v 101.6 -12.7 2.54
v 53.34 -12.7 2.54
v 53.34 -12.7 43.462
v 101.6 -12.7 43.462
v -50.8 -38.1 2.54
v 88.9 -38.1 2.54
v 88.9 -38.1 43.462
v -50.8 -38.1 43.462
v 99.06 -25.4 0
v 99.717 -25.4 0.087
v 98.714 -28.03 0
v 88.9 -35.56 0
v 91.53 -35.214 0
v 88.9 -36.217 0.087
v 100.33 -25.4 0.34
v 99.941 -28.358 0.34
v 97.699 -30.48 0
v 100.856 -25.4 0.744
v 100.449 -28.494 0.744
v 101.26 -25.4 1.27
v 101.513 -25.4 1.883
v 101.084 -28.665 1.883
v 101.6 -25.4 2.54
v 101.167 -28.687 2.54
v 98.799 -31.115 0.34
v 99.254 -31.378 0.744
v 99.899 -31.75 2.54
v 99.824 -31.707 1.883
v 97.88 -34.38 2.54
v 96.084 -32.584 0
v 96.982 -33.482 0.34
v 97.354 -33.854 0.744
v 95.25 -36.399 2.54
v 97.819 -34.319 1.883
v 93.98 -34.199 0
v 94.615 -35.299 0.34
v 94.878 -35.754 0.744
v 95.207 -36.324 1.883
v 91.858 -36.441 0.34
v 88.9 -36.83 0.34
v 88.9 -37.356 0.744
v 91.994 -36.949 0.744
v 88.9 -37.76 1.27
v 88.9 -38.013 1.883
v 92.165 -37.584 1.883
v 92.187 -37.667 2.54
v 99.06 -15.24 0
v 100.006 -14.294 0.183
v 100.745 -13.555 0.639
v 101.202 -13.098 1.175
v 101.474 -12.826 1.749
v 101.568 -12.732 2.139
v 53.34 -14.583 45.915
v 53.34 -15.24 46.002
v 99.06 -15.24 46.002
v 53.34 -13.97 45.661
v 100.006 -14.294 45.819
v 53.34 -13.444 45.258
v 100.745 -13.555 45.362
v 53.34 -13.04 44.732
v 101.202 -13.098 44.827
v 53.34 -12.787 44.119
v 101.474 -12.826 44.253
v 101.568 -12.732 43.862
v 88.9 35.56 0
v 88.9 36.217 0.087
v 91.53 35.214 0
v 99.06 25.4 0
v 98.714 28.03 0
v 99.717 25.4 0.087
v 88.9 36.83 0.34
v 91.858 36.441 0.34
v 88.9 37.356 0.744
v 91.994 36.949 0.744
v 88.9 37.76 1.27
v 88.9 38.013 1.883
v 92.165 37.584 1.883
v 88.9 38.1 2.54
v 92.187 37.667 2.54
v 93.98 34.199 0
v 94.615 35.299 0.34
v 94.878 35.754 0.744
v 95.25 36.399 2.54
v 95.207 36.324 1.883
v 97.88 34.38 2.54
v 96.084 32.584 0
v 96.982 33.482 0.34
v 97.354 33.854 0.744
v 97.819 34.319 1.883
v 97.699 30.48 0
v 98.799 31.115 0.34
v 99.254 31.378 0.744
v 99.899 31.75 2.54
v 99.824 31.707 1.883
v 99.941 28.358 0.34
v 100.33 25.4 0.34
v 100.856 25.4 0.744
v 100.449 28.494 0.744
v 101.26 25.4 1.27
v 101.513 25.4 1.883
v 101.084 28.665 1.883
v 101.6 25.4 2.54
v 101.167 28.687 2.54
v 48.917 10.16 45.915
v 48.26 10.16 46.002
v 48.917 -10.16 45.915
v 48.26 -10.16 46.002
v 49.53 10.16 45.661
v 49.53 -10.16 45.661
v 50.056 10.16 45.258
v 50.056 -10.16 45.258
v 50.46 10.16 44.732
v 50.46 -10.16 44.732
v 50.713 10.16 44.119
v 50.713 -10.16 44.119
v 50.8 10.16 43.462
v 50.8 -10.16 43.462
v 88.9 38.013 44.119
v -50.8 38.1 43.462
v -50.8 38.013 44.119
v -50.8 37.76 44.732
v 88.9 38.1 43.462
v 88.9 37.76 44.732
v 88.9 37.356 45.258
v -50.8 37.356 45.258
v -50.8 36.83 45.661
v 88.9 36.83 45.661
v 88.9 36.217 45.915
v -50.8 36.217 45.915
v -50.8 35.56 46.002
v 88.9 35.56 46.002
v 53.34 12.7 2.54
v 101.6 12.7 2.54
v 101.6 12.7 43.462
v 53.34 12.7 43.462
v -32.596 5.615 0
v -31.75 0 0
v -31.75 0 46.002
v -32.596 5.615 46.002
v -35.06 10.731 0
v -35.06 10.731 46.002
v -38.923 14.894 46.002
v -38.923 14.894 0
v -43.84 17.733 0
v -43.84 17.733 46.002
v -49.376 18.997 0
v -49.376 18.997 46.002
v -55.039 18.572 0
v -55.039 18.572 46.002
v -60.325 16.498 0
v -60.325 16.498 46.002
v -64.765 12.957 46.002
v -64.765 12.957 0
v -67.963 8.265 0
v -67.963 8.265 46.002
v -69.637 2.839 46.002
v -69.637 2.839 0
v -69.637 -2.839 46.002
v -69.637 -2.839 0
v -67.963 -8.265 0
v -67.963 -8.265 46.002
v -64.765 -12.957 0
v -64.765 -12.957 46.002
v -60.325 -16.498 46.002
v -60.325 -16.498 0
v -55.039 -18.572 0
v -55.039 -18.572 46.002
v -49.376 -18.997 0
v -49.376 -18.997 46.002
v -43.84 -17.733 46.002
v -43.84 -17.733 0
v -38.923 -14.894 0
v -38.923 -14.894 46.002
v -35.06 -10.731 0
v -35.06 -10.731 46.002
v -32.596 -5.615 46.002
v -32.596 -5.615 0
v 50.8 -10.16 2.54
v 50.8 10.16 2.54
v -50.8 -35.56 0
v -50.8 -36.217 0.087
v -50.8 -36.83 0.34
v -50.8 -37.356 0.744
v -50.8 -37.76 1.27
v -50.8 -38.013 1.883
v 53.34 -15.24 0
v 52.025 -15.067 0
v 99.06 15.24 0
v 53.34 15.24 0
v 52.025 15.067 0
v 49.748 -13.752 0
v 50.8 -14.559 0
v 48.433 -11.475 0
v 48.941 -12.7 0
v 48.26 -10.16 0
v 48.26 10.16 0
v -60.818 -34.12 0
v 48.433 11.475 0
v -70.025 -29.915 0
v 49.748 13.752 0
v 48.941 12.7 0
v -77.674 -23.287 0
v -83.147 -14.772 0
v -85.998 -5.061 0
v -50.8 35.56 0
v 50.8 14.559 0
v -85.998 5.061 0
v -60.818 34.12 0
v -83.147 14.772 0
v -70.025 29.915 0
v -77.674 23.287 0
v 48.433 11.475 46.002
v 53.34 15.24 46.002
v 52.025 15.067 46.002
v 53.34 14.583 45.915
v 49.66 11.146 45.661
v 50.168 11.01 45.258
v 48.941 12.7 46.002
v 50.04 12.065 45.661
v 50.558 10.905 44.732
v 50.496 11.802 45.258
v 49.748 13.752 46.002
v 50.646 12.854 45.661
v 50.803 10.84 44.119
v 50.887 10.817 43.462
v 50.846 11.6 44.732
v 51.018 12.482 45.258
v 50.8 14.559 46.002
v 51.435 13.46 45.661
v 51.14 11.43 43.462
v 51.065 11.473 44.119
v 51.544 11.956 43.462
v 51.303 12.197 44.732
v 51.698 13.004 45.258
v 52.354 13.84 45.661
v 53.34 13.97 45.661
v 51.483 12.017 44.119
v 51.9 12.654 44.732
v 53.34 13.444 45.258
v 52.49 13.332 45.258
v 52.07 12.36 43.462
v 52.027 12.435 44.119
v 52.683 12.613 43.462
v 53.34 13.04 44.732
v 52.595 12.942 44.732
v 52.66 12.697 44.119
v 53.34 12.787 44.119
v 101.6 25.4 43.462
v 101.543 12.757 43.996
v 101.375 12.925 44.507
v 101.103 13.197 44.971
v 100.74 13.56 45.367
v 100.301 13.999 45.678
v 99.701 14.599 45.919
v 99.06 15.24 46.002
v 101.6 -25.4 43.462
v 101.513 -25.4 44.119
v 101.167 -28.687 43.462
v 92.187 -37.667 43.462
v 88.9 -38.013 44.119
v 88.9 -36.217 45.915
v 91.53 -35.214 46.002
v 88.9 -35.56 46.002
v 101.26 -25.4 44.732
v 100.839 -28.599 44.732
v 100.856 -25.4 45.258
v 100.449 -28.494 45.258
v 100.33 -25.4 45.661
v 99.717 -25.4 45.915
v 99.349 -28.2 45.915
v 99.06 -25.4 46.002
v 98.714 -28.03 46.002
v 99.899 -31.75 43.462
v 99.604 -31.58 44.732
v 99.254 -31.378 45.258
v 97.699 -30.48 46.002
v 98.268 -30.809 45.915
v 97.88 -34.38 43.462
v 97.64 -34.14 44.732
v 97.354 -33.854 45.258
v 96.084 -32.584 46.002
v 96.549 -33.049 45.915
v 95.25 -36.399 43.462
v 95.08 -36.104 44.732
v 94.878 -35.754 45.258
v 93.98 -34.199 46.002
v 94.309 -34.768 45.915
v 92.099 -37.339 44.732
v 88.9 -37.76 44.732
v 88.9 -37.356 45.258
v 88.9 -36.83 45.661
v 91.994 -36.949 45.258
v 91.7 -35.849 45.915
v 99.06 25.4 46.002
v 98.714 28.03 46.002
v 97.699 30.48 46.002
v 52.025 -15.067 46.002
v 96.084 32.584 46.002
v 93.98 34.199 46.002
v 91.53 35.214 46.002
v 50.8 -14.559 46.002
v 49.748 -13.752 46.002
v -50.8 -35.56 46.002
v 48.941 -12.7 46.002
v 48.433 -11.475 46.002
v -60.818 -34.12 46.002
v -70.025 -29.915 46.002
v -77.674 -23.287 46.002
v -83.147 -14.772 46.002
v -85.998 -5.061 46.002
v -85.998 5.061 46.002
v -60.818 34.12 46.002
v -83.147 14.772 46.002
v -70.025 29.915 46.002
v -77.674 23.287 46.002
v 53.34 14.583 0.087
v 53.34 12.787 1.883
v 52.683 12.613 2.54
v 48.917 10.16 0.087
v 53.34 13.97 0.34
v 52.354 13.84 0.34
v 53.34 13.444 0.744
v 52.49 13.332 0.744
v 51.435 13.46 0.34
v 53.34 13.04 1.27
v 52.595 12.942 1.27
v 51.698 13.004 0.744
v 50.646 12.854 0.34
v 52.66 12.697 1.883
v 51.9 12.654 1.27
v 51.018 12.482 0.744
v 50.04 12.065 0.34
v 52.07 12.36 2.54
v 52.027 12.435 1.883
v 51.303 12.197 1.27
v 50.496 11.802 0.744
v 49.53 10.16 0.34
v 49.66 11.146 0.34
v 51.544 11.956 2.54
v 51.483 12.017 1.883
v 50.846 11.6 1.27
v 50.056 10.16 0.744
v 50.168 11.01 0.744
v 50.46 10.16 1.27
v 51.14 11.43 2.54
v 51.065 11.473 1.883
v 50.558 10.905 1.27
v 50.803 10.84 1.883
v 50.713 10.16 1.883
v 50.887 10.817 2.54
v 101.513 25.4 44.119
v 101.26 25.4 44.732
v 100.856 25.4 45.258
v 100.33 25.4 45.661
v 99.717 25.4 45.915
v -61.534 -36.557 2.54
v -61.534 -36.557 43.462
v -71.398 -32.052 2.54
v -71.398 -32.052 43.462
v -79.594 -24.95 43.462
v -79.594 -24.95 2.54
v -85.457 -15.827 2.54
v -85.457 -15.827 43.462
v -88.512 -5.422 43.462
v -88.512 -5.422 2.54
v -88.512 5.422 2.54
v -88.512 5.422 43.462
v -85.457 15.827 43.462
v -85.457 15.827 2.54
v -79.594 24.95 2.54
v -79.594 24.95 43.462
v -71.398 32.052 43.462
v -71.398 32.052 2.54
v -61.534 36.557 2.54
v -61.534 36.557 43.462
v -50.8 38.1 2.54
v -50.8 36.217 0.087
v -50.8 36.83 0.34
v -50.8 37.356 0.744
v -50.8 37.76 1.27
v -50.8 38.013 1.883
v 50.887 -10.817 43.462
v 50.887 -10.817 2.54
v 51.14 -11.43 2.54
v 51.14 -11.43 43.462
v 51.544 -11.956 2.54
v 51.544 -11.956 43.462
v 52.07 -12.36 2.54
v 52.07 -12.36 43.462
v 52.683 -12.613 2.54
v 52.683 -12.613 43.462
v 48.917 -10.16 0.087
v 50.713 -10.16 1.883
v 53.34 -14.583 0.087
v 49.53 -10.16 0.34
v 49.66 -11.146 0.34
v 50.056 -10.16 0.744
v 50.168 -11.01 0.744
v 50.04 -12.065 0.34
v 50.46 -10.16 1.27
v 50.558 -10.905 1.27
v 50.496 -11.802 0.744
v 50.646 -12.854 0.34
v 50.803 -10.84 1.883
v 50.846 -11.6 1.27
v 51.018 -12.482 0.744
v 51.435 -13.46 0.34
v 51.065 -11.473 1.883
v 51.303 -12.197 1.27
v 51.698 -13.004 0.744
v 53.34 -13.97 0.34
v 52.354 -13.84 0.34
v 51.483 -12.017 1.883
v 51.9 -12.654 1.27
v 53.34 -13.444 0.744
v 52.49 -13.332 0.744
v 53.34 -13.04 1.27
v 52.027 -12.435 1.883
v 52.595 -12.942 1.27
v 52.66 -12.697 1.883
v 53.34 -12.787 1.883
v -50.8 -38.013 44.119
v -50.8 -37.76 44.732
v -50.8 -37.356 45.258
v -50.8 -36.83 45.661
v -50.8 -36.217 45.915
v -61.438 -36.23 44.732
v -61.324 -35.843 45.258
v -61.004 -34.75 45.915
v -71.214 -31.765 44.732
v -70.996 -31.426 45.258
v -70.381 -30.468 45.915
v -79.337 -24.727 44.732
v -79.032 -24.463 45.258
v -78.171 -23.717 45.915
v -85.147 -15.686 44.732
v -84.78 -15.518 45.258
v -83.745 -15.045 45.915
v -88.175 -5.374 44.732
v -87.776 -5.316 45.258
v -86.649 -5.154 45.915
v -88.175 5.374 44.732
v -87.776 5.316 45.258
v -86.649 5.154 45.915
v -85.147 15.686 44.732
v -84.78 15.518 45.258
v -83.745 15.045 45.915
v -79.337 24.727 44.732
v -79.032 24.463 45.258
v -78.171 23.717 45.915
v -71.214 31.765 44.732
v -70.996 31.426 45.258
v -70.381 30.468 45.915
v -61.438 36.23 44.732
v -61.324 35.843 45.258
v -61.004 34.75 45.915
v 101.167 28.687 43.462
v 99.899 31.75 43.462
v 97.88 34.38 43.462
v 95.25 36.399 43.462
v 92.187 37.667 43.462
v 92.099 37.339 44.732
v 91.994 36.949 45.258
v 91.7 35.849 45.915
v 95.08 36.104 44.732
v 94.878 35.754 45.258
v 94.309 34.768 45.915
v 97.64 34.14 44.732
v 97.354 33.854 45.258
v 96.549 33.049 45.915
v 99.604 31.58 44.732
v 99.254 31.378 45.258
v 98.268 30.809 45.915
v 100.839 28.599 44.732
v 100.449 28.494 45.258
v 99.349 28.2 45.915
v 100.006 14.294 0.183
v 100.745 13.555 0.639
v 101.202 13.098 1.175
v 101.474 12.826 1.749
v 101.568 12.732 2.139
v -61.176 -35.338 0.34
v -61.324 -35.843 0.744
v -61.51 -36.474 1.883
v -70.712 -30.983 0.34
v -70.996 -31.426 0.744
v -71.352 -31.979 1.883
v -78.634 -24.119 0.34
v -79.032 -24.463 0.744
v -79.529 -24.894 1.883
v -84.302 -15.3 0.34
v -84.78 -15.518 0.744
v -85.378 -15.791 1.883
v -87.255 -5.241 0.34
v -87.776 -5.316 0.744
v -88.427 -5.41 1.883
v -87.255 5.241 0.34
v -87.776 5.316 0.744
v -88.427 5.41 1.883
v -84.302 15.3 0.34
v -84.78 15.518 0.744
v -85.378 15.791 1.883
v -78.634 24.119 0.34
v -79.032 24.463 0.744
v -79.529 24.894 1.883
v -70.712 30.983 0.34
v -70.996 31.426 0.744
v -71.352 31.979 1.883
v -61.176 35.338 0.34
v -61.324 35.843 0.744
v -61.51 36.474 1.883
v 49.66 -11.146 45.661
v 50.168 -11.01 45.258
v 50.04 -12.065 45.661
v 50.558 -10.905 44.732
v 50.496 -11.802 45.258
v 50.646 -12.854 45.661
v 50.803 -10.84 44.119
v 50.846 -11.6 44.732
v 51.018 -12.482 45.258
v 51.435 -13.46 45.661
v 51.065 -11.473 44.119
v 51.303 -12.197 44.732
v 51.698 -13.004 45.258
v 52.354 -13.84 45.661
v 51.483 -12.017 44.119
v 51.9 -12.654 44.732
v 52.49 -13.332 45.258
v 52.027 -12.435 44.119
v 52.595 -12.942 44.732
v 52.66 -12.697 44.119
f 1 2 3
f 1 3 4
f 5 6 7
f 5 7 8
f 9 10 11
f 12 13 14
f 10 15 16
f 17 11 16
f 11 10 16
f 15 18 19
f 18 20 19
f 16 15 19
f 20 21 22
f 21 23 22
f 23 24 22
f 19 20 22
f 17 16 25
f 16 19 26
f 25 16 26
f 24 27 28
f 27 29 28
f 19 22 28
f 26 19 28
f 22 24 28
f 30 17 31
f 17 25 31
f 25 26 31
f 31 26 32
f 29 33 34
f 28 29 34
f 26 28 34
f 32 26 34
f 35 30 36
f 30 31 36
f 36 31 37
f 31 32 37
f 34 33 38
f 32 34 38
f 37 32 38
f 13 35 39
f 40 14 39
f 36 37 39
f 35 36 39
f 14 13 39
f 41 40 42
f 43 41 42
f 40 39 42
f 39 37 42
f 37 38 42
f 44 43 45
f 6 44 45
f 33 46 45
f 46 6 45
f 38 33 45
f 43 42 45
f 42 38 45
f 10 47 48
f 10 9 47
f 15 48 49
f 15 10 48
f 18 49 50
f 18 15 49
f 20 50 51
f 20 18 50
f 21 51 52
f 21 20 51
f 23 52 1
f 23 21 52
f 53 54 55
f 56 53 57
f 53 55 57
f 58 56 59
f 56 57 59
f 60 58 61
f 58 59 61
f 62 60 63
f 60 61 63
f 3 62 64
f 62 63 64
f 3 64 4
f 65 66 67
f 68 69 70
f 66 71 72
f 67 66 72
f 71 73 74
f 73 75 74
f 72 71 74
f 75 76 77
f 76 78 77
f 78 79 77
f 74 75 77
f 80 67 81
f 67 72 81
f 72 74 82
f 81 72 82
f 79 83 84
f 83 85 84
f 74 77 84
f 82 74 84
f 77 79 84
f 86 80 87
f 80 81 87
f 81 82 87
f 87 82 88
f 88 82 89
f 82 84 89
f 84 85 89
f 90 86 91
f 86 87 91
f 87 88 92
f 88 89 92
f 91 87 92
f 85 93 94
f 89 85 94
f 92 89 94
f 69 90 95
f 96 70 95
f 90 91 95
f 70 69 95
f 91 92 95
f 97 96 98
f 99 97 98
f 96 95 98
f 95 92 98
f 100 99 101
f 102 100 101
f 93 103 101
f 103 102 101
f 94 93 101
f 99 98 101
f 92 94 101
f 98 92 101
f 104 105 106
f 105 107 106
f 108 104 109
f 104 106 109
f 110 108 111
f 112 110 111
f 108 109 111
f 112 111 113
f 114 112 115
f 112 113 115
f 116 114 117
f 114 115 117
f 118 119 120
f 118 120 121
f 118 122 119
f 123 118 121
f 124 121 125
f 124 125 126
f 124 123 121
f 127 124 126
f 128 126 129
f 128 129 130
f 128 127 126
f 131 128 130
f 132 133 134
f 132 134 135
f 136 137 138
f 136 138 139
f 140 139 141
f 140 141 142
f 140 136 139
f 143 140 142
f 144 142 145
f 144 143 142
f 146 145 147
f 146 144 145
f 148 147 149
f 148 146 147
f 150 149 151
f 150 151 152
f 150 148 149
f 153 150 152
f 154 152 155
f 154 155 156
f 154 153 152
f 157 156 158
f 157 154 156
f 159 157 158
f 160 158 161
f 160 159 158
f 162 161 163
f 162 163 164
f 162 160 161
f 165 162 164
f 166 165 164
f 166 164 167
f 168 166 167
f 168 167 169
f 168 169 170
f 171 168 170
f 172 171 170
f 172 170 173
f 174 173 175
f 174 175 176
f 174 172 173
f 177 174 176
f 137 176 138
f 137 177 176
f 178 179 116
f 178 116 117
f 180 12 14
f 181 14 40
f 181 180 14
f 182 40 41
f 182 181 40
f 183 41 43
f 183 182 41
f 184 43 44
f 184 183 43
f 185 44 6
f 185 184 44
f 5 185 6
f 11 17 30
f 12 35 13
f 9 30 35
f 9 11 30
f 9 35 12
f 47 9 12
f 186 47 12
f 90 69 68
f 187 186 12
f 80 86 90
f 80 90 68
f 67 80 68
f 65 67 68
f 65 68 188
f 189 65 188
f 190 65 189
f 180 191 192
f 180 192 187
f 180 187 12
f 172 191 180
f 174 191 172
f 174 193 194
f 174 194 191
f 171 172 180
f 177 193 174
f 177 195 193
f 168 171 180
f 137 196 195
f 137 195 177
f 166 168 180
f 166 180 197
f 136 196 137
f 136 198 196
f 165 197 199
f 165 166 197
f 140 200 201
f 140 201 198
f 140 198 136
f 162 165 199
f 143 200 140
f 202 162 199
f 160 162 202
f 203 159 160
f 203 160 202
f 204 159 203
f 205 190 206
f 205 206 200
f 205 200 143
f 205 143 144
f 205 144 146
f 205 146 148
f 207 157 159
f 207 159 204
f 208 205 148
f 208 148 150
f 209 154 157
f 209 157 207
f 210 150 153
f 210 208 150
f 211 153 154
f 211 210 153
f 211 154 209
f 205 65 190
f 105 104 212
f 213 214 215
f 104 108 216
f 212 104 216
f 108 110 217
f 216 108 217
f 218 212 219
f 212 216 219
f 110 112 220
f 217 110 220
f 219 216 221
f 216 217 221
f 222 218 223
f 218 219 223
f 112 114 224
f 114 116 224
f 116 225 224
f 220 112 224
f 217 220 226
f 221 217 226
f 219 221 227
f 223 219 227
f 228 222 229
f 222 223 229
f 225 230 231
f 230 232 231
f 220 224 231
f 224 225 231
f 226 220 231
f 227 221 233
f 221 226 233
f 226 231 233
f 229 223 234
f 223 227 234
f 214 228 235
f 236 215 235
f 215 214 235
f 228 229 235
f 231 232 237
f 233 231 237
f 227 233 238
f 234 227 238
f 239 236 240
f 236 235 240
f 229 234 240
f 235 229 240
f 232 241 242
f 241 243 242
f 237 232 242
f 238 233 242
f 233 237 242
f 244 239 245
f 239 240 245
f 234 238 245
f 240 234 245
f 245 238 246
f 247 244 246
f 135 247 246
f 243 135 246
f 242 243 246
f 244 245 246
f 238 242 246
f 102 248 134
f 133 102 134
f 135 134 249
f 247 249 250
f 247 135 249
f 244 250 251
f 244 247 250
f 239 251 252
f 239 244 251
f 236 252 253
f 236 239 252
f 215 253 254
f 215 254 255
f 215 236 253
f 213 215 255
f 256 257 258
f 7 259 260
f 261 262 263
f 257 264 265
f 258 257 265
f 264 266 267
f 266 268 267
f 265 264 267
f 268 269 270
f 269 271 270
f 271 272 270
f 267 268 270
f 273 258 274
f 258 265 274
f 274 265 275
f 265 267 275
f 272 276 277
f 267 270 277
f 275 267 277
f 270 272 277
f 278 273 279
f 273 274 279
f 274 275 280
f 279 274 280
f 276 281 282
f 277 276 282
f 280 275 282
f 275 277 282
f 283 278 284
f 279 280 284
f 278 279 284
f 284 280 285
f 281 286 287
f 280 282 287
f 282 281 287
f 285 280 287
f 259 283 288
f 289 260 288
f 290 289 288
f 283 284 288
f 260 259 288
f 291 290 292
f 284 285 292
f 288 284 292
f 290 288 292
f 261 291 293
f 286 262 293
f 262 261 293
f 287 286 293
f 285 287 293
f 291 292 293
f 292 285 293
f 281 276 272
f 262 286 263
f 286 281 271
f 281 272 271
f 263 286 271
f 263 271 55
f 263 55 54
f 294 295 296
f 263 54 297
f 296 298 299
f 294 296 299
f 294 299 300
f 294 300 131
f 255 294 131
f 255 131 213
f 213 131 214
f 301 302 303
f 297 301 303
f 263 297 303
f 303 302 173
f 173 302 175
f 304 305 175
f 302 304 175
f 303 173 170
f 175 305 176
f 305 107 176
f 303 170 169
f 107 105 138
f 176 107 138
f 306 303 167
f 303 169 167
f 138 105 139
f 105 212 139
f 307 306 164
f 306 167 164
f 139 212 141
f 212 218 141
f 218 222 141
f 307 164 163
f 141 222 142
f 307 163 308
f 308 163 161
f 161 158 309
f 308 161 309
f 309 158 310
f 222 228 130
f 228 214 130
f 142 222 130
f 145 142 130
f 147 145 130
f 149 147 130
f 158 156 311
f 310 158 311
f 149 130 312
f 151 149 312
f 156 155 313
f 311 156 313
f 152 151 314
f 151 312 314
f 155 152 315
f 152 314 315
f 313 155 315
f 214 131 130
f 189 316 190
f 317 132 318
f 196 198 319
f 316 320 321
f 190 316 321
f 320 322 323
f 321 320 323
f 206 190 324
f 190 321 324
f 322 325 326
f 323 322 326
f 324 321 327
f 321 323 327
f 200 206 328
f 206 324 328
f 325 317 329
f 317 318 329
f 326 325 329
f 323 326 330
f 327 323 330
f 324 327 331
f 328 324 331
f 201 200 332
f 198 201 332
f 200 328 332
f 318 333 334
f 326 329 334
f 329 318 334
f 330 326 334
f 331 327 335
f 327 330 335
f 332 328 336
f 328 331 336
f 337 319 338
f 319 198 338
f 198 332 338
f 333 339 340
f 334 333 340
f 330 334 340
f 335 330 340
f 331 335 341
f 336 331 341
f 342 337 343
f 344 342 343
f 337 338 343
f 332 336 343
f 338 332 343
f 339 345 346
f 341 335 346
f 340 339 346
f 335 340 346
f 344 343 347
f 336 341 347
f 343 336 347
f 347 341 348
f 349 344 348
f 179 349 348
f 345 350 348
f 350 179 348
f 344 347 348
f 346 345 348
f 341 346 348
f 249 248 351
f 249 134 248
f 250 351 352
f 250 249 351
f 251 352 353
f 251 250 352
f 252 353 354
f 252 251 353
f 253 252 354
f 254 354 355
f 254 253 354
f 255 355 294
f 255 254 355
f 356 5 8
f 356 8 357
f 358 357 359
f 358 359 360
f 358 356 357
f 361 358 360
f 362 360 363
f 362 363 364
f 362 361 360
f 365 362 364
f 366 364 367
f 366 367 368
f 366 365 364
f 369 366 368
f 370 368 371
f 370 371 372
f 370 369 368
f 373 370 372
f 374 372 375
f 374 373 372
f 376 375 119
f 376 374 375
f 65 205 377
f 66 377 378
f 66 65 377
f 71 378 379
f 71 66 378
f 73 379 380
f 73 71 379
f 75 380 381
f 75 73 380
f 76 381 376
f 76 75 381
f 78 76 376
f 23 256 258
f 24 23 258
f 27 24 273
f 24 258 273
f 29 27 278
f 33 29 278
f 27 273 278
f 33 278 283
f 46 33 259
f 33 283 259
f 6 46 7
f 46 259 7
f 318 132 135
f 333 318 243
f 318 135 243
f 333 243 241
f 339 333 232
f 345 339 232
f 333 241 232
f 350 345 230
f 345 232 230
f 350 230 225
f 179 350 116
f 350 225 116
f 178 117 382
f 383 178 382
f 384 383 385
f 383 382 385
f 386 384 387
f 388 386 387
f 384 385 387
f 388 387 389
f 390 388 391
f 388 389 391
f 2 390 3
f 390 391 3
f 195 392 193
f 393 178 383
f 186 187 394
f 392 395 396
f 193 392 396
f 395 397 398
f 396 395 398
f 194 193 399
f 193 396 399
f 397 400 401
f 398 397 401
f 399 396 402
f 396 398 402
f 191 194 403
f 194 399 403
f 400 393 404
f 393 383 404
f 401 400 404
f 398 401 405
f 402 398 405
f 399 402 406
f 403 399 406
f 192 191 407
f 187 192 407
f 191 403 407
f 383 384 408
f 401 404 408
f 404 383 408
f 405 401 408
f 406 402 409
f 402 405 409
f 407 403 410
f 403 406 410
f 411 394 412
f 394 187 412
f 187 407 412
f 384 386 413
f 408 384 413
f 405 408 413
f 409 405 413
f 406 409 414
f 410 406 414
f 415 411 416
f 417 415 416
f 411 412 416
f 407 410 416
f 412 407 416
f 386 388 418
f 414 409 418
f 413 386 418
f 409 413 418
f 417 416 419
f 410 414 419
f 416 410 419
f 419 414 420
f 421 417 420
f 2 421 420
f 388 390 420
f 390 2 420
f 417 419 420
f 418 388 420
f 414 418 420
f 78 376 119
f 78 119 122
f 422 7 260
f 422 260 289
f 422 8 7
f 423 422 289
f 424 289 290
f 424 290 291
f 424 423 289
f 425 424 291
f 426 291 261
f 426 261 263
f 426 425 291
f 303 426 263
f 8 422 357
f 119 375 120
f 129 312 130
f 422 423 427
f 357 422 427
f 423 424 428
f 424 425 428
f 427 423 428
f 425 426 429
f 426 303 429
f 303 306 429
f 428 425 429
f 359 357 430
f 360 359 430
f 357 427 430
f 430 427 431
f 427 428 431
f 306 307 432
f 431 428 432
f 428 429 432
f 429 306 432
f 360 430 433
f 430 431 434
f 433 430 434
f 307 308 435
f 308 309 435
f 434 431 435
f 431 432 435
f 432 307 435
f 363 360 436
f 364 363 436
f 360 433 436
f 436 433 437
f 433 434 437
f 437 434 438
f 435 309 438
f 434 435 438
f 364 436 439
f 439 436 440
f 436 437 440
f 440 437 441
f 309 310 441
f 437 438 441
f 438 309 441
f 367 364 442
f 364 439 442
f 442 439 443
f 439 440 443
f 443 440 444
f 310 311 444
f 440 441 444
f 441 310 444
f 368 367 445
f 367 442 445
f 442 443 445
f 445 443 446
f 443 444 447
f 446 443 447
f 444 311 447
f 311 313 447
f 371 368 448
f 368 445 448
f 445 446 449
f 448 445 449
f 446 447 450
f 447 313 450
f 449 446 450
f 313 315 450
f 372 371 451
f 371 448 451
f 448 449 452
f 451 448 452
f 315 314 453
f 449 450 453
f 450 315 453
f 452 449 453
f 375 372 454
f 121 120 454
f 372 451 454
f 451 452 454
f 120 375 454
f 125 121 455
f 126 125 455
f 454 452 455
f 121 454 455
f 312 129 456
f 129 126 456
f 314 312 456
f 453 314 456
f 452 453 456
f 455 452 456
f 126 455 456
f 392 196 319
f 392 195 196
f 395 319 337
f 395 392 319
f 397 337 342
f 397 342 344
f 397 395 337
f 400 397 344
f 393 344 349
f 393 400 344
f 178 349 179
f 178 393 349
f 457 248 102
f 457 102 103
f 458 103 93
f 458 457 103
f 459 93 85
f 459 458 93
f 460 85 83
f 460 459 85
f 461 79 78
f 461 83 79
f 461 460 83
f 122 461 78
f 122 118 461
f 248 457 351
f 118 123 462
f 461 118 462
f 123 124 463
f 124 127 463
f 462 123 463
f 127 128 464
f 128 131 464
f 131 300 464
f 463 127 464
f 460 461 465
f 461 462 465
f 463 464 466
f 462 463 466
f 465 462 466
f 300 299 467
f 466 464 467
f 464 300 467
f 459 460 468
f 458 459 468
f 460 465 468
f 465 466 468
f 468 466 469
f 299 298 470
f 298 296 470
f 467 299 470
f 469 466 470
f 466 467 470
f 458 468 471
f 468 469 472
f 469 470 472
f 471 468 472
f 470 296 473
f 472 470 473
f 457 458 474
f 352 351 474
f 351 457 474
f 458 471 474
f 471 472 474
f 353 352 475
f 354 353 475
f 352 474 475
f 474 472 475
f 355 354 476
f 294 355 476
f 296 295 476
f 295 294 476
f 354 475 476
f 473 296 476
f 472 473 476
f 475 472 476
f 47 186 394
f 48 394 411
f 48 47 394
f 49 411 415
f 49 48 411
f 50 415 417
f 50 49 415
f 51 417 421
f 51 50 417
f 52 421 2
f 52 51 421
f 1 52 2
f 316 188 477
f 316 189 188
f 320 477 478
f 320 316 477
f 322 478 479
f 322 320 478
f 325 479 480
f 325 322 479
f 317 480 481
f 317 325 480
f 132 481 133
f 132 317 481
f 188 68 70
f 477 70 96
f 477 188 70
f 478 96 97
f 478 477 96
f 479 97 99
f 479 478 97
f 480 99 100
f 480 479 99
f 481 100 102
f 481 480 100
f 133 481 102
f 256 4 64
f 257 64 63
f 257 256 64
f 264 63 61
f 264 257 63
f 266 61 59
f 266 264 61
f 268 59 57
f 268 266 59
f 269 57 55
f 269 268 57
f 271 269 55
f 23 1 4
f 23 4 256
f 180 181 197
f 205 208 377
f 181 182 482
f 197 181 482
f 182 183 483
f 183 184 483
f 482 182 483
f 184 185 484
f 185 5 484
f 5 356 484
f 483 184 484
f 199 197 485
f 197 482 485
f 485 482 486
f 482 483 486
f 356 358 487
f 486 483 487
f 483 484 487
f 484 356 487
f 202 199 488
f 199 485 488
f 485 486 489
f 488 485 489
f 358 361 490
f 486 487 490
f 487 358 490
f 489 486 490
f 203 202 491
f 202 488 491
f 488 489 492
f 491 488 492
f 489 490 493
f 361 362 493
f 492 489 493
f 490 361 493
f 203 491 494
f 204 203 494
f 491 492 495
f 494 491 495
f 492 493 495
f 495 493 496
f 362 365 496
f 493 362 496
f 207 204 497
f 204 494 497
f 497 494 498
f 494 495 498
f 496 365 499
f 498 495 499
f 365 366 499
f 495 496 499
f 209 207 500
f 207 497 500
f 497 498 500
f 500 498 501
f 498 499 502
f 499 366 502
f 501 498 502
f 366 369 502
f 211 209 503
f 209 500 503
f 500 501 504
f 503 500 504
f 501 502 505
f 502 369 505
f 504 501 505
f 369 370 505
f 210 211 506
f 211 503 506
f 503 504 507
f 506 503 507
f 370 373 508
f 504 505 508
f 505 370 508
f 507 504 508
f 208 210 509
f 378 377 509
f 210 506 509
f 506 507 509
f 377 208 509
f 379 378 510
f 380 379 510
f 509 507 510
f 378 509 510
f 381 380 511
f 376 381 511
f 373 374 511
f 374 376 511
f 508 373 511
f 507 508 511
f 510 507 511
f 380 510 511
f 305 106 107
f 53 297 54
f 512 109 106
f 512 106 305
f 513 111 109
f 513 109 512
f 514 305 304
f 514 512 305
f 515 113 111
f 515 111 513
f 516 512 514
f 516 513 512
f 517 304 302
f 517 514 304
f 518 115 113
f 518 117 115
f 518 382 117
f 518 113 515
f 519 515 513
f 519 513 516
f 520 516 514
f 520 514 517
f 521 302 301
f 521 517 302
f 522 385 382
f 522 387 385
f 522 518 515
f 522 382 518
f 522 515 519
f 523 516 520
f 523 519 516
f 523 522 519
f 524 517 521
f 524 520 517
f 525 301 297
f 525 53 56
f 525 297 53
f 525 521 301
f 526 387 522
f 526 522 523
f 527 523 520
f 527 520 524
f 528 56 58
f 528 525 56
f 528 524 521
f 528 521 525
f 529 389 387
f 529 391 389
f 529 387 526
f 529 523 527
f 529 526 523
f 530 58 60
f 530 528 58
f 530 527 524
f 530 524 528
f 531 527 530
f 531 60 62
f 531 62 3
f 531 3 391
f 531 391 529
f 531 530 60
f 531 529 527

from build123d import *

# Parameters (mm, degrees)
SKETCH1_R           = 19.05
BOSS_EXTRUDE1_DEPTH = 46.001643057
FILLET1_R           = 12.7
FILLET2_R           = 2.54


with BuildPart() as part:
    # Sketch1 → Boss-Extrude1 (new body)
    with BuildSketch(Plane.XY):
        with BuildLine():
            Line((101.6, 12.7), (50.8, 12.7))
            Line((50.8, 12.7), (50.8, -12.7))
            Line((50.8, -12.7), (101.6, -12.7))
            Line((101.6, -12.7), (101.6, -38.1))
            Line((101.6, -38.1), (-50.8, -38.1))
            ThreePointArc((-50.8, -38.1), (-88.9, 0), (-50.8, 38.1))
            Line((-50.8, 38.1), (101.6, 38.1))
            Line((101.6, 38.1), (101.6, 12.7))
        make_face()
        with Locations((-50.8, 0)):
            Circle(SKETCH1_R, mode=Mode.SUBTRACT)
    extrude(amount=BOSS_EXTRUDE1_DEPTH)

    # Fillet1
    fillet1_edges = [part.edges().sort_by_distance(p)[0] for p in [
        (101.6, 38.1, 23.000821528),
        (101.6, -38.1, 23.000821528),
    ]]
    fillet(fillet1_edges, radius=FILLET1_R)

    # Fillet2
    fillet2_edges = [part.edges().sort_by_distance(p)[0] for p in [
        (19.05, -38.1, 0),
        (-88.9, 0, 0),
        (76.2, -12.7, 46.001643057),
        (50.8, 12.7, 23.000821528),
        (50.8, -12.7, 23.000821528),
        (50.8, 0, 46.001643057),
        (76.2, 12.7, 46.001643057),
        (101.6, 19.05, 46.001643057),
        (101.6, -19.05, 0),
        (101.6, -19.05, 46.001643057),
        (19.05, 38.1, 0),
        (97.880256121, 34.380256121, 0),
        (97.880256121, -34.380256121, 0),
        (19.05, 38.1, 46.001643057),
        (97.880256121, 34.380256121, 46.001643057),
        (97.880256121, -34.380256121, 46.001643057),
        (-88.9, 0, 46.001643057),
        (19.05, -38.1, 46.001643057),
        (101.6, 19.05, 0),
        (76.2, 12.7, 0),
        (50.8, 0, 0),
        (76.2, -12.7, 0),
    ]]
    fillet(fillet2_edges, radius=FILLET2_R)


solid = part.part
